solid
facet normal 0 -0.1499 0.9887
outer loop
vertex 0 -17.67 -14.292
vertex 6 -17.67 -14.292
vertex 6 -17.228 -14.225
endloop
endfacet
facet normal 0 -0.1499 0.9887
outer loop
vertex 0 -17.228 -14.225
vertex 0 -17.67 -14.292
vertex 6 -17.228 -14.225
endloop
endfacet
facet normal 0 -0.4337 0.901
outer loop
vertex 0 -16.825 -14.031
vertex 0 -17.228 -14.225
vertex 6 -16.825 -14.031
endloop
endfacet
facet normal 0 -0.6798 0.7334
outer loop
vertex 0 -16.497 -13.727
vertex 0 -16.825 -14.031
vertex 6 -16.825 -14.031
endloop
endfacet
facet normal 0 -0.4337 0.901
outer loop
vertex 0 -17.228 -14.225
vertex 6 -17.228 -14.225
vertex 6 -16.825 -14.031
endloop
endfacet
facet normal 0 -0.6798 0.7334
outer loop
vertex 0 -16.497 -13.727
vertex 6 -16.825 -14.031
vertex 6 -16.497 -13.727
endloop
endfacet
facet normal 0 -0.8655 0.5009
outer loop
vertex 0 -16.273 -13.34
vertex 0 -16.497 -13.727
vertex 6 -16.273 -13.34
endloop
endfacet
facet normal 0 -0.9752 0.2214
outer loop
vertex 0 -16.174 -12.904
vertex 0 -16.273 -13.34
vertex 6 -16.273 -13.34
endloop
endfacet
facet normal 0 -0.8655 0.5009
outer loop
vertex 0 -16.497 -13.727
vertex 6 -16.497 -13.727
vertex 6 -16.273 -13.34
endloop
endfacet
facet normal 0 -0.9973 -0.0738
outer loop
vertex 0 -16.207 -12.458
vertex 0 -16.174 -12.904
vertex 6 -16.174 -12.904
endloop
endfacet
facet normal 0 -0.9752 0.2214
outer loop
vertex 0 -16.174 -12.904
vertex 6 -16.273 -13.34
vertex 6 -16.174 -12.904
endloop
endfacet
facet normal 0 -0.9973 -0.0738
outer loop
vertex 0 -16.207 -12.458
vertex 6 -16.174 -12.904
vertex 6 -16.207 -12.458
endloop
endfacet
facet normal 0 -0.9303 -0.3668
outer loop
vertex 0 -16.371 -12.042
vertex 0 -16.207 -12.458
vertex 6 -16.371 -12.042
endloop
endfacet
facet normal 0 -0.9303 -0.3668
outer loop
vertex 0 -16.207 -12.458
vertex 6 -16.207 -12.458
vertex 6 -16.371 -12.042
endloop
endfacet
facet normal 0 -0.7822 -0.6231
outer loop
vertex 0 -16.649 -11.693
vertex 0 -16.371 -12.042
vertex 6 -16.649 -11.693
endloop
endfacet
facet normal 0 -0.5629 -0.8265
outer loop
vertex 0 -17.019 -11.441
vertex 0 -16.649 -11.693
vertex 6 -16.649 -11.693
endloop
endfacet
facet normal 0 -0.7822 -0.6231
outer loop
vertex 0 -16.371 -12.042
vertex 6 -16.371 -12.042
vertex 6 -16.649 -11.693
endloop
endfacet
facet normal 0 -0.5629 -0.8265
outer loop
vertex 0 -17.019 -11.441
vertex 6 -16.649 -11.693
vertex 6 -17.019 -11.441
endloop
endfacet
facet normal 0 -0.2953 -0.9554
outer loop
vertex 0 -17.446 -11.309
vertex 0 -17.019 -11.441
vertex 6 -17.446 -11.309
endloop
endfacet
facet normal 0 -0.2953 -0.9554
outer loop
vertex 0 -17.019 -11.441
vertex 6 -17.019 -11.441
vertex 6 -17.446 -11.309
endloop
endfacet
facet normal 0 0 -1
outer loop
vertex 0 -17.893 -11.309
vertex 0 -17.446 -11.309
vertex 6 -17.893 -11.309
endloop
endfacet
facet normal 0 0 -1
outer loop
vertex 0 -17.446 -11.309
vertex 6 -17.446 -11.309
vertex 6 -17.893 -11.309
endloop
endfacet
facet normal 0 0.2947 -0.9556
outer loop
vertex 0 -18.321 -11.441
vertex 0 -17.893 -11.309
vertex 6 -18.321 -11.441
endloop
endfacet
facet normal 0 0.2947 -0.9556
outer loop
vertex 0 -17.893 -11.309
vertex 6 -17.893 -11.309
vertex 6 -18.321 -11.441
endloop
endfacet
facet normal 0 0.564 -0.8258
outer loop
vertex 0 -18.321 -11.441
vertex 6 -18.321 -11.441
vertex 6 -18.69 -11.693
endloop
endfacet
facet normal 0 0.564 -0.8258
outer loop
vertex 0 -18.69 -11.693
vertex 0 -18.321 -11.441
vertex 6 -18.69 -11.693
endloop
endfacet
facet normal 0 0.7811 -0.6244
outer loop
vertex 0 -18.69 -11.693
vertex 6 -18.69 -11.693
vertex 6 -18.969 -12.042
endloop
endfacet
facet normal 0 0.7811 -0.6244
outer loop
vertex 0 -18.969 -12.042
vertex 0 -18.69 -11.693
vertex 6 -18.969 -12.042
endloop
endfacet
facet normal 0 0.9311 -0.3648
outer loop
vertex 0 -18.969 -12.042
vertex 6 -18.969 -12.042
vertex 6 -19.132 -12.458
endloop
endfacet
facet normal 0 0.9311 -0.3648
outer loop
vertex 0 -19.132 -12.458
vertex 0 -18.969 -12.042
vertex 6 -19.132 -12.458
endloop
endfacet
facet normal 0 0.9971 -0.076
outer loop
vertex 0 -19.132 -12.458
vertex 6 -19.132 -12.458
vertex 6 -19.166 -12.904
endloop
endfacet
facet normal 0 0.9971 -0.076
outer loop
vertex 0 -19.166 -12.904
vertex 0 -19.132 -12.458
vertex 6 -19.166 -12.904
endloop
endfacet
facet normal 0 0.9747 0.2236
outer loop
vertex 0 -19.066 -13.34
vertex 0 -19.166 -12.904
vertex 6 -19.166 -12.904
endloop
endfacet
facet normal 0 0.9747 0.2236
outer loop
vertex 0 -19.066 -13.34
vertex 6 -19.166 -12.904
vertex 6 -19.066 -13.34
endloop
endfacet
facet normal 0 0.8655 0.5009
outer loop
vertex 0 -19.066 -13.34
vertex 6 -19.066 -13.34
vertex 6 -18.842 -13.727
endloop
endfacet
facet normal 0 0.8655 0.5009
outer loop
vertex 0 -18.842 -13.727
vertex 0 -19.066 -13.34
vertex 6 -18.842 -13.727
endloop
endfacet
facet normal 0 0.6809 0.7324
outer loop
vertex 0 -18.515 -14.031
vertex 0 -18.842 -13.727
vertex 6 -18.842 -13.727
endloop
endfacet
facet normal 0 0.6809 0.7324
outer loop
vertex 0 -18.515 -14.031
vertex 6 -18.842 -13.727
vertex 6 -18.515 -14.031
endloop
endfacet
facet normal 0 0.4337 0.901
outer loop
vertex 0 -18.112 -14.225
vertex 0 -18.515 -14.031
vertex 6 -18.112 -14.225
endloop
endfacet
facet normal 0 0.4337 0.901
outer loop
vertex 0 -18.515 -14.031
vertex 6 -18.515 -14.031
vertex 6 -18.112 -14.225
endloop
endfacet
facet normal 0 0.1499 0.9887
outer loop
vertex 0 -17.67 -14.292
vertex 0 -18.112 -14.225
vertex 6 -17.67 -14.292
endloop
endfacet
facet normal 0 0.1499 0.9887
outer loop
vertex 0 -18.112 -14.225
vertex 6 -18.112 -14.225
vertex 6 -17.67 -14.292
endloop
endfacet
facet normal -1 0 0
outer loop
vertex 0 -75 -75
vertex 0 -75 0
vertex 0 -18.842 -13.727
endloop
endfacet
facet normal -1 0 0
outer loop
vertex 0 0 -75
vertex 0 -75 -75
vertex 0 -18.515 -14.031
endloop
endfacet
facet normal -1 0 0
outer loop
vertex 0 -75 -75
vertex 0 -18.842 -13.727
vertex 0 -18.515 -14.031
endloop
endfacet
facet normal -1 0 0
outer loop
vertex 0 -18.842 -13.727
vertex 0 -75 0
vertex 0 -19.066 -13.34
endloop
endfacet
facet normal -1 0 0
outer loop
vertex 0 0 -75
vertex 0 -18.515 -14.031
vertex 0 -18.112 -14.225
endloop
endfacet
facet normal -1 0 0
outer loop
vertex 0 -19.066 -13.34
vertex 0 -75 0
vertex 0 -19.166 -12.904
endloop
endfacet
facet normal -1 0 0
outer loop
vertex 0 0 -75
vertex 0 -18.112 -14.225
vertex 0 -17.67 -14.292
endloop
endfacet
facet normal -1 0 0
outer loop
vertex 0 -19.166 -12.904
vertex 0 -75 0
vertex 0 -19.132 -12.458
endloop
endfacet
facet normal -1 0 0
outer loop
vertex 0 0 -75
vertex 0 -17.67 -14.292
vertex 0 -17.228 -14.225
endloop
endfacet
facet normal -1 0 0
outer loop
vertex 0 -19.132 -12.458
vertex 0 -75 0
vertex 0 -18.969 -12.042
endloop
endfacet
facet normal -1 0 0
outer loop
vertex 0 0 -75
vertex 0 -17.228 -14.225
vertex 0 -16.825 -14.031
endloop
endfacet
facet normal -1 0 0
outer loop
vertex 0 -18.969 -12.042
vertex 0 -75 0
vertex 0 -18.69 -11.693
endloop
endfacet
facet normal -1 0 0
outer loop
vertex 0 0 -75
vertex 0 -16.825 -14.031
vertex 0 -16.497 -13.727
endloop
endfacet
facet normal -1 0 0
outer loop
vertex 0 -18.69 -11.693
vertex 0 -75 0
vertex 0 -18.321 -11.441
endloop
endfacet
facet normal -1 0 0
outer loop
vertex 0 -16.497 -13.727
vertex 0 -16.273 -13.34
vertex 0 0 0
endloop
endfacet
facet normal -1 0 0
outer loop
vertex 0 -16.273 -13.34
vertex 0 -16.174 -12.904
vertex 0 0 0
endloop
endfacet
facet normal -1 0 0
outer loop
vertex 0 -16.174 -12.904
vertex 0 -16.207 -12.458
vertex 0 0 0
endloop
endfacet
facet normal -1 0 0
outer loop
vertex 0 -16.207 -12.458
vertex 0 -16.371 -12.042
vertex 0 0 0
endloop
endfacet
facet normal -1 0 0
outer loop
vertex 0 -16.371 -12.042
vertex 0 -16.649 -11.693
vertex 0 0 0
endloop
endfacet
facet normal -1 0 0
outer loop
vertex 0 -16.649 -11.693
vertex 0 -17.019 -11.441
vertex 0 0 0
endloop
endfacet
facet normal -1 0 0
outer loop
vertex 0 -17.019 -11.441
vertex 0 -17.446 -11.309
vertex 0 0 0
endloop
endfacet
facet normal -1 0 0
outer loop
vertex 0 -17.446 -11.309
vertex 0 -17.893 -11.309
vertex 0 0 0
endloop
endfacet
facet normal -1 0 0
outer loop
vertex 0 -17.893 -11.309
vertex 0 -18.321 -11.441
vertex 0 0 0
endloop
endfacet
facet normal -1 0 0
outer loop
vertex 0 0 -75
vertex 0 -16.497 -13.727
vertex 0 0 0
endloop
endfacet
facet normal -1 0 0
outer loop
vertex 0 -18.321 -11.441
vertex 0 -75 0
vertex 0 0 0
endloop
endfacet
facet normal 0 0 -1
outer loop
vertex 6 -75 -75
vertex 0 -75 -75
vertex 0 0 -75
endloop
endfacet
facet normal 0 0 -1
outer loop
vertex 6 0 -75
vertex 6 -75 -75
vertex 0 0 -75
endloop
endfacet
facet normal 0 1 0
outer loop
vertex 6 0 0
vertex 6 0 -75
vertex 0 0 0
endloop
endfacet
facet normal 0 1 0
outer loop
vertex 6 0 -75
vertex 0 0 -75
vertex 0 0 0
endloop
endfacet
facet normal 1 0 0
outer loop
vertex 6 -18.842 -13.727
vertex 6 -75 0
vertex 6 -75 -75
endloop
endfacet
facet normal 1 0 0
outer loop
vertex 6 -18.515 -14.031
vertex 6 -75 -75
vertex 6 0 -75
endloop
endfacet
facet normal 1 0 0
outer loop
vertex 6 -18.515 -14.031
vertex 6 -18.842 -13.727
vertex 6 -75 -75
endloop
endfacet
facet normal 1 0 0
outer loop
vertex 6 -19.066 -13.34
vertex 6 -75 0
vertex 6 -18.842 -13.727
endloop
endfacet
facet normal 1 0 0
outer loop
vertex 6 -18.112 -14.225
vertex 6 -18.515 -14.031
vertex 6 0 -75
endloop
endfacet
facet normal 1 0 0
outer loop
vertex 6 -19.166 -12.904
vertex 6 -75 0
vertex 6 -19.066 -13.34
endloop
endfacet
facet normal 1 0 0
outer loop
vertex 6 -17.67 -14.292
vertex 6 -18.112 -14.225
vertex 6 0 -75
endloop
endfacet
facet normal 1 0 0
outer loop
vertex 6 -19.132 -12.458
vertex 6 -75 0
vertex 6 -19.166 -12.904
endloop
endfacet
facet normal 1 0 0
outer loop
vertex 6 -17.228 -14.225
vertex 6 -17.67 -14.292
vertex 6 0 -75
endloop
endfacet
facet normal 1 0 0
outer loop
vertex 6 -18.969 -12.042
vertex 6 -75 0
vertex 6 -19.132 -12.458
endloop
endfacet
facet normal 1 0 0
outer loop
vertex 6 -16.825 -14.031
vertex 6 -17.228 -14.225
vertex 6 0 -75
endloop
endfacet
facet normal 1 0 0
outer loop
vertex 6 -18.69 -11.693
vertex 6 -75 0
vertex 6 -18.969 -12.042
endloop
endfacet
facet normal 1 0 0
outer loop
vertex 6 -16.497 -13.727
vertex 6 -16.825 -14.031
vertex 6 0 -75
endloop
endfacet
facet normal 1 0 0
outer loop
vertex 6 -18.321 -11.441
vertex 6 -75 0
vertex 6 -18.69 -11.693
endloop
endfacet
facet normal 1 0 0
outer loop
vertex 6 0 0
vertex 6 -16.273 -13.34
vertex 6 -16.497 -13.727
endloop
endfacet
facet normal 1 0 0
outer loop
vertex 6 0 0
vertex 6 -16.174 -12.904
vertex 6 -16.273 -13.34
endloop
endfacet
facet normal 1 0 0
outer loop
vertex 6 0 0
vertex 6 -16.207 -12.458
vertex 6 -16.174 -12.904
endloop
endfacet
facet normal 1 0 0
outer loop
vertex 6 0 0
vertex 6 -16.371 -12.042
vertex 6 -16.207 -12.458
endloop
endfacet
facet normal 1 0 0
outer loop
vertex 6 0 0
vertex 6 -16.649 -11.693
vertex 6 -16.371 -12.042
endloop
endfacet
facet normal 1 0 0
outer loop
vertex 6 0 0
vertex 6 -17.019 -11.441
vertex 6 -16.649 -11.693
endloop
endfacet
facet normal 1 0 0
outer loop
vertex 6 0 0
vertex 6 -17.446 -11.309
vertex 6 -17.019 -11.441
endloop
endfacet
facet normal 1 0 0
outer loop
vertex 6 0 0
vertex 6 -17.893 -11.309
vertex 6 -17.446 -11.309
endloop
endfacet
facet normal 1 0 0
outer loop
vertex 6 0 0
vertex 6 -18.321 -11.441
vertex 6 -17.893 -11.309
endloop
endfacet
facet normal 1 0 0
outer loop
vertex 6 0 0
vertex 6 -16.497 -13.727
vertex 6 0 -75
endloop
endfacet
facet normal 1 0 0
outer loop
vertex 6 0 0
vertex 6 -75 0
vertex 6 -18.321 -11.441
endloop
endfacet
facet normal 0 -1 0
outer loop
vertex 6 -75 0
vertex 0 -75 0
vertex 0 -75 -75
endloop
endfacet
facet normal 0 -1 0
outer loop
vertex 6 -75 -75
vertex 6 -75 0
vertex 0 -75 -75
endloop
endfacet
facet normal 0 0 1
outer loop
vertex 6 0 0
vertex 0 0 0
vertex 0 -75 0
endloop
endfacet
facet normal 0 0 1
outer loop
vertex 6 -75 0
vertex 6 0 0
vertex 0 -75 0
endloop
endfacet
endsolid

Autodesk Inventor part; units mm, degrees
ref_plane "YZ Plane" through (0, 0, 0) normal (1, 0, 0) x (0, 1, 0)
ref_plane "XZ Plane" through (0, 0, 0) normal (0, 1, 0) x (-1, 0, 0)
ref_plane "XY Plane" through (0, 0, 0) normal (0, 0, 1) x (1, 0, 0)
sketch "Sketch3" plane through (0, 0, 0) normal (1, 0, 0) x (0, 1, 0)
  line L0 (0, 0) -> (-75, 0)
  line L1 (-75, 0) -> (-75, -75)
  line L2 (-75, -75) -> (0, -75)
  line L3 (0, -75) -> (0, 0)
  dimension "d0" = 75
  dimension "d1" = 75
extrude "Extrusion1" add sketch "Sketch3" along normal blind 6
sketch "Sketch5" plane through (6, 0, 0) normal (1, 0, 0) x (0, 0, -1)
  circle A0 centre (12.7921, -17.6697) radius 1.5
  point P0 (0, 0)
  dimension "d27" = 3
extrude "Extrusion3" cut sketch "Sketch5" against normal blind 8.2875
equation "\"d0\" = d1"
properties part number "Reflector"
